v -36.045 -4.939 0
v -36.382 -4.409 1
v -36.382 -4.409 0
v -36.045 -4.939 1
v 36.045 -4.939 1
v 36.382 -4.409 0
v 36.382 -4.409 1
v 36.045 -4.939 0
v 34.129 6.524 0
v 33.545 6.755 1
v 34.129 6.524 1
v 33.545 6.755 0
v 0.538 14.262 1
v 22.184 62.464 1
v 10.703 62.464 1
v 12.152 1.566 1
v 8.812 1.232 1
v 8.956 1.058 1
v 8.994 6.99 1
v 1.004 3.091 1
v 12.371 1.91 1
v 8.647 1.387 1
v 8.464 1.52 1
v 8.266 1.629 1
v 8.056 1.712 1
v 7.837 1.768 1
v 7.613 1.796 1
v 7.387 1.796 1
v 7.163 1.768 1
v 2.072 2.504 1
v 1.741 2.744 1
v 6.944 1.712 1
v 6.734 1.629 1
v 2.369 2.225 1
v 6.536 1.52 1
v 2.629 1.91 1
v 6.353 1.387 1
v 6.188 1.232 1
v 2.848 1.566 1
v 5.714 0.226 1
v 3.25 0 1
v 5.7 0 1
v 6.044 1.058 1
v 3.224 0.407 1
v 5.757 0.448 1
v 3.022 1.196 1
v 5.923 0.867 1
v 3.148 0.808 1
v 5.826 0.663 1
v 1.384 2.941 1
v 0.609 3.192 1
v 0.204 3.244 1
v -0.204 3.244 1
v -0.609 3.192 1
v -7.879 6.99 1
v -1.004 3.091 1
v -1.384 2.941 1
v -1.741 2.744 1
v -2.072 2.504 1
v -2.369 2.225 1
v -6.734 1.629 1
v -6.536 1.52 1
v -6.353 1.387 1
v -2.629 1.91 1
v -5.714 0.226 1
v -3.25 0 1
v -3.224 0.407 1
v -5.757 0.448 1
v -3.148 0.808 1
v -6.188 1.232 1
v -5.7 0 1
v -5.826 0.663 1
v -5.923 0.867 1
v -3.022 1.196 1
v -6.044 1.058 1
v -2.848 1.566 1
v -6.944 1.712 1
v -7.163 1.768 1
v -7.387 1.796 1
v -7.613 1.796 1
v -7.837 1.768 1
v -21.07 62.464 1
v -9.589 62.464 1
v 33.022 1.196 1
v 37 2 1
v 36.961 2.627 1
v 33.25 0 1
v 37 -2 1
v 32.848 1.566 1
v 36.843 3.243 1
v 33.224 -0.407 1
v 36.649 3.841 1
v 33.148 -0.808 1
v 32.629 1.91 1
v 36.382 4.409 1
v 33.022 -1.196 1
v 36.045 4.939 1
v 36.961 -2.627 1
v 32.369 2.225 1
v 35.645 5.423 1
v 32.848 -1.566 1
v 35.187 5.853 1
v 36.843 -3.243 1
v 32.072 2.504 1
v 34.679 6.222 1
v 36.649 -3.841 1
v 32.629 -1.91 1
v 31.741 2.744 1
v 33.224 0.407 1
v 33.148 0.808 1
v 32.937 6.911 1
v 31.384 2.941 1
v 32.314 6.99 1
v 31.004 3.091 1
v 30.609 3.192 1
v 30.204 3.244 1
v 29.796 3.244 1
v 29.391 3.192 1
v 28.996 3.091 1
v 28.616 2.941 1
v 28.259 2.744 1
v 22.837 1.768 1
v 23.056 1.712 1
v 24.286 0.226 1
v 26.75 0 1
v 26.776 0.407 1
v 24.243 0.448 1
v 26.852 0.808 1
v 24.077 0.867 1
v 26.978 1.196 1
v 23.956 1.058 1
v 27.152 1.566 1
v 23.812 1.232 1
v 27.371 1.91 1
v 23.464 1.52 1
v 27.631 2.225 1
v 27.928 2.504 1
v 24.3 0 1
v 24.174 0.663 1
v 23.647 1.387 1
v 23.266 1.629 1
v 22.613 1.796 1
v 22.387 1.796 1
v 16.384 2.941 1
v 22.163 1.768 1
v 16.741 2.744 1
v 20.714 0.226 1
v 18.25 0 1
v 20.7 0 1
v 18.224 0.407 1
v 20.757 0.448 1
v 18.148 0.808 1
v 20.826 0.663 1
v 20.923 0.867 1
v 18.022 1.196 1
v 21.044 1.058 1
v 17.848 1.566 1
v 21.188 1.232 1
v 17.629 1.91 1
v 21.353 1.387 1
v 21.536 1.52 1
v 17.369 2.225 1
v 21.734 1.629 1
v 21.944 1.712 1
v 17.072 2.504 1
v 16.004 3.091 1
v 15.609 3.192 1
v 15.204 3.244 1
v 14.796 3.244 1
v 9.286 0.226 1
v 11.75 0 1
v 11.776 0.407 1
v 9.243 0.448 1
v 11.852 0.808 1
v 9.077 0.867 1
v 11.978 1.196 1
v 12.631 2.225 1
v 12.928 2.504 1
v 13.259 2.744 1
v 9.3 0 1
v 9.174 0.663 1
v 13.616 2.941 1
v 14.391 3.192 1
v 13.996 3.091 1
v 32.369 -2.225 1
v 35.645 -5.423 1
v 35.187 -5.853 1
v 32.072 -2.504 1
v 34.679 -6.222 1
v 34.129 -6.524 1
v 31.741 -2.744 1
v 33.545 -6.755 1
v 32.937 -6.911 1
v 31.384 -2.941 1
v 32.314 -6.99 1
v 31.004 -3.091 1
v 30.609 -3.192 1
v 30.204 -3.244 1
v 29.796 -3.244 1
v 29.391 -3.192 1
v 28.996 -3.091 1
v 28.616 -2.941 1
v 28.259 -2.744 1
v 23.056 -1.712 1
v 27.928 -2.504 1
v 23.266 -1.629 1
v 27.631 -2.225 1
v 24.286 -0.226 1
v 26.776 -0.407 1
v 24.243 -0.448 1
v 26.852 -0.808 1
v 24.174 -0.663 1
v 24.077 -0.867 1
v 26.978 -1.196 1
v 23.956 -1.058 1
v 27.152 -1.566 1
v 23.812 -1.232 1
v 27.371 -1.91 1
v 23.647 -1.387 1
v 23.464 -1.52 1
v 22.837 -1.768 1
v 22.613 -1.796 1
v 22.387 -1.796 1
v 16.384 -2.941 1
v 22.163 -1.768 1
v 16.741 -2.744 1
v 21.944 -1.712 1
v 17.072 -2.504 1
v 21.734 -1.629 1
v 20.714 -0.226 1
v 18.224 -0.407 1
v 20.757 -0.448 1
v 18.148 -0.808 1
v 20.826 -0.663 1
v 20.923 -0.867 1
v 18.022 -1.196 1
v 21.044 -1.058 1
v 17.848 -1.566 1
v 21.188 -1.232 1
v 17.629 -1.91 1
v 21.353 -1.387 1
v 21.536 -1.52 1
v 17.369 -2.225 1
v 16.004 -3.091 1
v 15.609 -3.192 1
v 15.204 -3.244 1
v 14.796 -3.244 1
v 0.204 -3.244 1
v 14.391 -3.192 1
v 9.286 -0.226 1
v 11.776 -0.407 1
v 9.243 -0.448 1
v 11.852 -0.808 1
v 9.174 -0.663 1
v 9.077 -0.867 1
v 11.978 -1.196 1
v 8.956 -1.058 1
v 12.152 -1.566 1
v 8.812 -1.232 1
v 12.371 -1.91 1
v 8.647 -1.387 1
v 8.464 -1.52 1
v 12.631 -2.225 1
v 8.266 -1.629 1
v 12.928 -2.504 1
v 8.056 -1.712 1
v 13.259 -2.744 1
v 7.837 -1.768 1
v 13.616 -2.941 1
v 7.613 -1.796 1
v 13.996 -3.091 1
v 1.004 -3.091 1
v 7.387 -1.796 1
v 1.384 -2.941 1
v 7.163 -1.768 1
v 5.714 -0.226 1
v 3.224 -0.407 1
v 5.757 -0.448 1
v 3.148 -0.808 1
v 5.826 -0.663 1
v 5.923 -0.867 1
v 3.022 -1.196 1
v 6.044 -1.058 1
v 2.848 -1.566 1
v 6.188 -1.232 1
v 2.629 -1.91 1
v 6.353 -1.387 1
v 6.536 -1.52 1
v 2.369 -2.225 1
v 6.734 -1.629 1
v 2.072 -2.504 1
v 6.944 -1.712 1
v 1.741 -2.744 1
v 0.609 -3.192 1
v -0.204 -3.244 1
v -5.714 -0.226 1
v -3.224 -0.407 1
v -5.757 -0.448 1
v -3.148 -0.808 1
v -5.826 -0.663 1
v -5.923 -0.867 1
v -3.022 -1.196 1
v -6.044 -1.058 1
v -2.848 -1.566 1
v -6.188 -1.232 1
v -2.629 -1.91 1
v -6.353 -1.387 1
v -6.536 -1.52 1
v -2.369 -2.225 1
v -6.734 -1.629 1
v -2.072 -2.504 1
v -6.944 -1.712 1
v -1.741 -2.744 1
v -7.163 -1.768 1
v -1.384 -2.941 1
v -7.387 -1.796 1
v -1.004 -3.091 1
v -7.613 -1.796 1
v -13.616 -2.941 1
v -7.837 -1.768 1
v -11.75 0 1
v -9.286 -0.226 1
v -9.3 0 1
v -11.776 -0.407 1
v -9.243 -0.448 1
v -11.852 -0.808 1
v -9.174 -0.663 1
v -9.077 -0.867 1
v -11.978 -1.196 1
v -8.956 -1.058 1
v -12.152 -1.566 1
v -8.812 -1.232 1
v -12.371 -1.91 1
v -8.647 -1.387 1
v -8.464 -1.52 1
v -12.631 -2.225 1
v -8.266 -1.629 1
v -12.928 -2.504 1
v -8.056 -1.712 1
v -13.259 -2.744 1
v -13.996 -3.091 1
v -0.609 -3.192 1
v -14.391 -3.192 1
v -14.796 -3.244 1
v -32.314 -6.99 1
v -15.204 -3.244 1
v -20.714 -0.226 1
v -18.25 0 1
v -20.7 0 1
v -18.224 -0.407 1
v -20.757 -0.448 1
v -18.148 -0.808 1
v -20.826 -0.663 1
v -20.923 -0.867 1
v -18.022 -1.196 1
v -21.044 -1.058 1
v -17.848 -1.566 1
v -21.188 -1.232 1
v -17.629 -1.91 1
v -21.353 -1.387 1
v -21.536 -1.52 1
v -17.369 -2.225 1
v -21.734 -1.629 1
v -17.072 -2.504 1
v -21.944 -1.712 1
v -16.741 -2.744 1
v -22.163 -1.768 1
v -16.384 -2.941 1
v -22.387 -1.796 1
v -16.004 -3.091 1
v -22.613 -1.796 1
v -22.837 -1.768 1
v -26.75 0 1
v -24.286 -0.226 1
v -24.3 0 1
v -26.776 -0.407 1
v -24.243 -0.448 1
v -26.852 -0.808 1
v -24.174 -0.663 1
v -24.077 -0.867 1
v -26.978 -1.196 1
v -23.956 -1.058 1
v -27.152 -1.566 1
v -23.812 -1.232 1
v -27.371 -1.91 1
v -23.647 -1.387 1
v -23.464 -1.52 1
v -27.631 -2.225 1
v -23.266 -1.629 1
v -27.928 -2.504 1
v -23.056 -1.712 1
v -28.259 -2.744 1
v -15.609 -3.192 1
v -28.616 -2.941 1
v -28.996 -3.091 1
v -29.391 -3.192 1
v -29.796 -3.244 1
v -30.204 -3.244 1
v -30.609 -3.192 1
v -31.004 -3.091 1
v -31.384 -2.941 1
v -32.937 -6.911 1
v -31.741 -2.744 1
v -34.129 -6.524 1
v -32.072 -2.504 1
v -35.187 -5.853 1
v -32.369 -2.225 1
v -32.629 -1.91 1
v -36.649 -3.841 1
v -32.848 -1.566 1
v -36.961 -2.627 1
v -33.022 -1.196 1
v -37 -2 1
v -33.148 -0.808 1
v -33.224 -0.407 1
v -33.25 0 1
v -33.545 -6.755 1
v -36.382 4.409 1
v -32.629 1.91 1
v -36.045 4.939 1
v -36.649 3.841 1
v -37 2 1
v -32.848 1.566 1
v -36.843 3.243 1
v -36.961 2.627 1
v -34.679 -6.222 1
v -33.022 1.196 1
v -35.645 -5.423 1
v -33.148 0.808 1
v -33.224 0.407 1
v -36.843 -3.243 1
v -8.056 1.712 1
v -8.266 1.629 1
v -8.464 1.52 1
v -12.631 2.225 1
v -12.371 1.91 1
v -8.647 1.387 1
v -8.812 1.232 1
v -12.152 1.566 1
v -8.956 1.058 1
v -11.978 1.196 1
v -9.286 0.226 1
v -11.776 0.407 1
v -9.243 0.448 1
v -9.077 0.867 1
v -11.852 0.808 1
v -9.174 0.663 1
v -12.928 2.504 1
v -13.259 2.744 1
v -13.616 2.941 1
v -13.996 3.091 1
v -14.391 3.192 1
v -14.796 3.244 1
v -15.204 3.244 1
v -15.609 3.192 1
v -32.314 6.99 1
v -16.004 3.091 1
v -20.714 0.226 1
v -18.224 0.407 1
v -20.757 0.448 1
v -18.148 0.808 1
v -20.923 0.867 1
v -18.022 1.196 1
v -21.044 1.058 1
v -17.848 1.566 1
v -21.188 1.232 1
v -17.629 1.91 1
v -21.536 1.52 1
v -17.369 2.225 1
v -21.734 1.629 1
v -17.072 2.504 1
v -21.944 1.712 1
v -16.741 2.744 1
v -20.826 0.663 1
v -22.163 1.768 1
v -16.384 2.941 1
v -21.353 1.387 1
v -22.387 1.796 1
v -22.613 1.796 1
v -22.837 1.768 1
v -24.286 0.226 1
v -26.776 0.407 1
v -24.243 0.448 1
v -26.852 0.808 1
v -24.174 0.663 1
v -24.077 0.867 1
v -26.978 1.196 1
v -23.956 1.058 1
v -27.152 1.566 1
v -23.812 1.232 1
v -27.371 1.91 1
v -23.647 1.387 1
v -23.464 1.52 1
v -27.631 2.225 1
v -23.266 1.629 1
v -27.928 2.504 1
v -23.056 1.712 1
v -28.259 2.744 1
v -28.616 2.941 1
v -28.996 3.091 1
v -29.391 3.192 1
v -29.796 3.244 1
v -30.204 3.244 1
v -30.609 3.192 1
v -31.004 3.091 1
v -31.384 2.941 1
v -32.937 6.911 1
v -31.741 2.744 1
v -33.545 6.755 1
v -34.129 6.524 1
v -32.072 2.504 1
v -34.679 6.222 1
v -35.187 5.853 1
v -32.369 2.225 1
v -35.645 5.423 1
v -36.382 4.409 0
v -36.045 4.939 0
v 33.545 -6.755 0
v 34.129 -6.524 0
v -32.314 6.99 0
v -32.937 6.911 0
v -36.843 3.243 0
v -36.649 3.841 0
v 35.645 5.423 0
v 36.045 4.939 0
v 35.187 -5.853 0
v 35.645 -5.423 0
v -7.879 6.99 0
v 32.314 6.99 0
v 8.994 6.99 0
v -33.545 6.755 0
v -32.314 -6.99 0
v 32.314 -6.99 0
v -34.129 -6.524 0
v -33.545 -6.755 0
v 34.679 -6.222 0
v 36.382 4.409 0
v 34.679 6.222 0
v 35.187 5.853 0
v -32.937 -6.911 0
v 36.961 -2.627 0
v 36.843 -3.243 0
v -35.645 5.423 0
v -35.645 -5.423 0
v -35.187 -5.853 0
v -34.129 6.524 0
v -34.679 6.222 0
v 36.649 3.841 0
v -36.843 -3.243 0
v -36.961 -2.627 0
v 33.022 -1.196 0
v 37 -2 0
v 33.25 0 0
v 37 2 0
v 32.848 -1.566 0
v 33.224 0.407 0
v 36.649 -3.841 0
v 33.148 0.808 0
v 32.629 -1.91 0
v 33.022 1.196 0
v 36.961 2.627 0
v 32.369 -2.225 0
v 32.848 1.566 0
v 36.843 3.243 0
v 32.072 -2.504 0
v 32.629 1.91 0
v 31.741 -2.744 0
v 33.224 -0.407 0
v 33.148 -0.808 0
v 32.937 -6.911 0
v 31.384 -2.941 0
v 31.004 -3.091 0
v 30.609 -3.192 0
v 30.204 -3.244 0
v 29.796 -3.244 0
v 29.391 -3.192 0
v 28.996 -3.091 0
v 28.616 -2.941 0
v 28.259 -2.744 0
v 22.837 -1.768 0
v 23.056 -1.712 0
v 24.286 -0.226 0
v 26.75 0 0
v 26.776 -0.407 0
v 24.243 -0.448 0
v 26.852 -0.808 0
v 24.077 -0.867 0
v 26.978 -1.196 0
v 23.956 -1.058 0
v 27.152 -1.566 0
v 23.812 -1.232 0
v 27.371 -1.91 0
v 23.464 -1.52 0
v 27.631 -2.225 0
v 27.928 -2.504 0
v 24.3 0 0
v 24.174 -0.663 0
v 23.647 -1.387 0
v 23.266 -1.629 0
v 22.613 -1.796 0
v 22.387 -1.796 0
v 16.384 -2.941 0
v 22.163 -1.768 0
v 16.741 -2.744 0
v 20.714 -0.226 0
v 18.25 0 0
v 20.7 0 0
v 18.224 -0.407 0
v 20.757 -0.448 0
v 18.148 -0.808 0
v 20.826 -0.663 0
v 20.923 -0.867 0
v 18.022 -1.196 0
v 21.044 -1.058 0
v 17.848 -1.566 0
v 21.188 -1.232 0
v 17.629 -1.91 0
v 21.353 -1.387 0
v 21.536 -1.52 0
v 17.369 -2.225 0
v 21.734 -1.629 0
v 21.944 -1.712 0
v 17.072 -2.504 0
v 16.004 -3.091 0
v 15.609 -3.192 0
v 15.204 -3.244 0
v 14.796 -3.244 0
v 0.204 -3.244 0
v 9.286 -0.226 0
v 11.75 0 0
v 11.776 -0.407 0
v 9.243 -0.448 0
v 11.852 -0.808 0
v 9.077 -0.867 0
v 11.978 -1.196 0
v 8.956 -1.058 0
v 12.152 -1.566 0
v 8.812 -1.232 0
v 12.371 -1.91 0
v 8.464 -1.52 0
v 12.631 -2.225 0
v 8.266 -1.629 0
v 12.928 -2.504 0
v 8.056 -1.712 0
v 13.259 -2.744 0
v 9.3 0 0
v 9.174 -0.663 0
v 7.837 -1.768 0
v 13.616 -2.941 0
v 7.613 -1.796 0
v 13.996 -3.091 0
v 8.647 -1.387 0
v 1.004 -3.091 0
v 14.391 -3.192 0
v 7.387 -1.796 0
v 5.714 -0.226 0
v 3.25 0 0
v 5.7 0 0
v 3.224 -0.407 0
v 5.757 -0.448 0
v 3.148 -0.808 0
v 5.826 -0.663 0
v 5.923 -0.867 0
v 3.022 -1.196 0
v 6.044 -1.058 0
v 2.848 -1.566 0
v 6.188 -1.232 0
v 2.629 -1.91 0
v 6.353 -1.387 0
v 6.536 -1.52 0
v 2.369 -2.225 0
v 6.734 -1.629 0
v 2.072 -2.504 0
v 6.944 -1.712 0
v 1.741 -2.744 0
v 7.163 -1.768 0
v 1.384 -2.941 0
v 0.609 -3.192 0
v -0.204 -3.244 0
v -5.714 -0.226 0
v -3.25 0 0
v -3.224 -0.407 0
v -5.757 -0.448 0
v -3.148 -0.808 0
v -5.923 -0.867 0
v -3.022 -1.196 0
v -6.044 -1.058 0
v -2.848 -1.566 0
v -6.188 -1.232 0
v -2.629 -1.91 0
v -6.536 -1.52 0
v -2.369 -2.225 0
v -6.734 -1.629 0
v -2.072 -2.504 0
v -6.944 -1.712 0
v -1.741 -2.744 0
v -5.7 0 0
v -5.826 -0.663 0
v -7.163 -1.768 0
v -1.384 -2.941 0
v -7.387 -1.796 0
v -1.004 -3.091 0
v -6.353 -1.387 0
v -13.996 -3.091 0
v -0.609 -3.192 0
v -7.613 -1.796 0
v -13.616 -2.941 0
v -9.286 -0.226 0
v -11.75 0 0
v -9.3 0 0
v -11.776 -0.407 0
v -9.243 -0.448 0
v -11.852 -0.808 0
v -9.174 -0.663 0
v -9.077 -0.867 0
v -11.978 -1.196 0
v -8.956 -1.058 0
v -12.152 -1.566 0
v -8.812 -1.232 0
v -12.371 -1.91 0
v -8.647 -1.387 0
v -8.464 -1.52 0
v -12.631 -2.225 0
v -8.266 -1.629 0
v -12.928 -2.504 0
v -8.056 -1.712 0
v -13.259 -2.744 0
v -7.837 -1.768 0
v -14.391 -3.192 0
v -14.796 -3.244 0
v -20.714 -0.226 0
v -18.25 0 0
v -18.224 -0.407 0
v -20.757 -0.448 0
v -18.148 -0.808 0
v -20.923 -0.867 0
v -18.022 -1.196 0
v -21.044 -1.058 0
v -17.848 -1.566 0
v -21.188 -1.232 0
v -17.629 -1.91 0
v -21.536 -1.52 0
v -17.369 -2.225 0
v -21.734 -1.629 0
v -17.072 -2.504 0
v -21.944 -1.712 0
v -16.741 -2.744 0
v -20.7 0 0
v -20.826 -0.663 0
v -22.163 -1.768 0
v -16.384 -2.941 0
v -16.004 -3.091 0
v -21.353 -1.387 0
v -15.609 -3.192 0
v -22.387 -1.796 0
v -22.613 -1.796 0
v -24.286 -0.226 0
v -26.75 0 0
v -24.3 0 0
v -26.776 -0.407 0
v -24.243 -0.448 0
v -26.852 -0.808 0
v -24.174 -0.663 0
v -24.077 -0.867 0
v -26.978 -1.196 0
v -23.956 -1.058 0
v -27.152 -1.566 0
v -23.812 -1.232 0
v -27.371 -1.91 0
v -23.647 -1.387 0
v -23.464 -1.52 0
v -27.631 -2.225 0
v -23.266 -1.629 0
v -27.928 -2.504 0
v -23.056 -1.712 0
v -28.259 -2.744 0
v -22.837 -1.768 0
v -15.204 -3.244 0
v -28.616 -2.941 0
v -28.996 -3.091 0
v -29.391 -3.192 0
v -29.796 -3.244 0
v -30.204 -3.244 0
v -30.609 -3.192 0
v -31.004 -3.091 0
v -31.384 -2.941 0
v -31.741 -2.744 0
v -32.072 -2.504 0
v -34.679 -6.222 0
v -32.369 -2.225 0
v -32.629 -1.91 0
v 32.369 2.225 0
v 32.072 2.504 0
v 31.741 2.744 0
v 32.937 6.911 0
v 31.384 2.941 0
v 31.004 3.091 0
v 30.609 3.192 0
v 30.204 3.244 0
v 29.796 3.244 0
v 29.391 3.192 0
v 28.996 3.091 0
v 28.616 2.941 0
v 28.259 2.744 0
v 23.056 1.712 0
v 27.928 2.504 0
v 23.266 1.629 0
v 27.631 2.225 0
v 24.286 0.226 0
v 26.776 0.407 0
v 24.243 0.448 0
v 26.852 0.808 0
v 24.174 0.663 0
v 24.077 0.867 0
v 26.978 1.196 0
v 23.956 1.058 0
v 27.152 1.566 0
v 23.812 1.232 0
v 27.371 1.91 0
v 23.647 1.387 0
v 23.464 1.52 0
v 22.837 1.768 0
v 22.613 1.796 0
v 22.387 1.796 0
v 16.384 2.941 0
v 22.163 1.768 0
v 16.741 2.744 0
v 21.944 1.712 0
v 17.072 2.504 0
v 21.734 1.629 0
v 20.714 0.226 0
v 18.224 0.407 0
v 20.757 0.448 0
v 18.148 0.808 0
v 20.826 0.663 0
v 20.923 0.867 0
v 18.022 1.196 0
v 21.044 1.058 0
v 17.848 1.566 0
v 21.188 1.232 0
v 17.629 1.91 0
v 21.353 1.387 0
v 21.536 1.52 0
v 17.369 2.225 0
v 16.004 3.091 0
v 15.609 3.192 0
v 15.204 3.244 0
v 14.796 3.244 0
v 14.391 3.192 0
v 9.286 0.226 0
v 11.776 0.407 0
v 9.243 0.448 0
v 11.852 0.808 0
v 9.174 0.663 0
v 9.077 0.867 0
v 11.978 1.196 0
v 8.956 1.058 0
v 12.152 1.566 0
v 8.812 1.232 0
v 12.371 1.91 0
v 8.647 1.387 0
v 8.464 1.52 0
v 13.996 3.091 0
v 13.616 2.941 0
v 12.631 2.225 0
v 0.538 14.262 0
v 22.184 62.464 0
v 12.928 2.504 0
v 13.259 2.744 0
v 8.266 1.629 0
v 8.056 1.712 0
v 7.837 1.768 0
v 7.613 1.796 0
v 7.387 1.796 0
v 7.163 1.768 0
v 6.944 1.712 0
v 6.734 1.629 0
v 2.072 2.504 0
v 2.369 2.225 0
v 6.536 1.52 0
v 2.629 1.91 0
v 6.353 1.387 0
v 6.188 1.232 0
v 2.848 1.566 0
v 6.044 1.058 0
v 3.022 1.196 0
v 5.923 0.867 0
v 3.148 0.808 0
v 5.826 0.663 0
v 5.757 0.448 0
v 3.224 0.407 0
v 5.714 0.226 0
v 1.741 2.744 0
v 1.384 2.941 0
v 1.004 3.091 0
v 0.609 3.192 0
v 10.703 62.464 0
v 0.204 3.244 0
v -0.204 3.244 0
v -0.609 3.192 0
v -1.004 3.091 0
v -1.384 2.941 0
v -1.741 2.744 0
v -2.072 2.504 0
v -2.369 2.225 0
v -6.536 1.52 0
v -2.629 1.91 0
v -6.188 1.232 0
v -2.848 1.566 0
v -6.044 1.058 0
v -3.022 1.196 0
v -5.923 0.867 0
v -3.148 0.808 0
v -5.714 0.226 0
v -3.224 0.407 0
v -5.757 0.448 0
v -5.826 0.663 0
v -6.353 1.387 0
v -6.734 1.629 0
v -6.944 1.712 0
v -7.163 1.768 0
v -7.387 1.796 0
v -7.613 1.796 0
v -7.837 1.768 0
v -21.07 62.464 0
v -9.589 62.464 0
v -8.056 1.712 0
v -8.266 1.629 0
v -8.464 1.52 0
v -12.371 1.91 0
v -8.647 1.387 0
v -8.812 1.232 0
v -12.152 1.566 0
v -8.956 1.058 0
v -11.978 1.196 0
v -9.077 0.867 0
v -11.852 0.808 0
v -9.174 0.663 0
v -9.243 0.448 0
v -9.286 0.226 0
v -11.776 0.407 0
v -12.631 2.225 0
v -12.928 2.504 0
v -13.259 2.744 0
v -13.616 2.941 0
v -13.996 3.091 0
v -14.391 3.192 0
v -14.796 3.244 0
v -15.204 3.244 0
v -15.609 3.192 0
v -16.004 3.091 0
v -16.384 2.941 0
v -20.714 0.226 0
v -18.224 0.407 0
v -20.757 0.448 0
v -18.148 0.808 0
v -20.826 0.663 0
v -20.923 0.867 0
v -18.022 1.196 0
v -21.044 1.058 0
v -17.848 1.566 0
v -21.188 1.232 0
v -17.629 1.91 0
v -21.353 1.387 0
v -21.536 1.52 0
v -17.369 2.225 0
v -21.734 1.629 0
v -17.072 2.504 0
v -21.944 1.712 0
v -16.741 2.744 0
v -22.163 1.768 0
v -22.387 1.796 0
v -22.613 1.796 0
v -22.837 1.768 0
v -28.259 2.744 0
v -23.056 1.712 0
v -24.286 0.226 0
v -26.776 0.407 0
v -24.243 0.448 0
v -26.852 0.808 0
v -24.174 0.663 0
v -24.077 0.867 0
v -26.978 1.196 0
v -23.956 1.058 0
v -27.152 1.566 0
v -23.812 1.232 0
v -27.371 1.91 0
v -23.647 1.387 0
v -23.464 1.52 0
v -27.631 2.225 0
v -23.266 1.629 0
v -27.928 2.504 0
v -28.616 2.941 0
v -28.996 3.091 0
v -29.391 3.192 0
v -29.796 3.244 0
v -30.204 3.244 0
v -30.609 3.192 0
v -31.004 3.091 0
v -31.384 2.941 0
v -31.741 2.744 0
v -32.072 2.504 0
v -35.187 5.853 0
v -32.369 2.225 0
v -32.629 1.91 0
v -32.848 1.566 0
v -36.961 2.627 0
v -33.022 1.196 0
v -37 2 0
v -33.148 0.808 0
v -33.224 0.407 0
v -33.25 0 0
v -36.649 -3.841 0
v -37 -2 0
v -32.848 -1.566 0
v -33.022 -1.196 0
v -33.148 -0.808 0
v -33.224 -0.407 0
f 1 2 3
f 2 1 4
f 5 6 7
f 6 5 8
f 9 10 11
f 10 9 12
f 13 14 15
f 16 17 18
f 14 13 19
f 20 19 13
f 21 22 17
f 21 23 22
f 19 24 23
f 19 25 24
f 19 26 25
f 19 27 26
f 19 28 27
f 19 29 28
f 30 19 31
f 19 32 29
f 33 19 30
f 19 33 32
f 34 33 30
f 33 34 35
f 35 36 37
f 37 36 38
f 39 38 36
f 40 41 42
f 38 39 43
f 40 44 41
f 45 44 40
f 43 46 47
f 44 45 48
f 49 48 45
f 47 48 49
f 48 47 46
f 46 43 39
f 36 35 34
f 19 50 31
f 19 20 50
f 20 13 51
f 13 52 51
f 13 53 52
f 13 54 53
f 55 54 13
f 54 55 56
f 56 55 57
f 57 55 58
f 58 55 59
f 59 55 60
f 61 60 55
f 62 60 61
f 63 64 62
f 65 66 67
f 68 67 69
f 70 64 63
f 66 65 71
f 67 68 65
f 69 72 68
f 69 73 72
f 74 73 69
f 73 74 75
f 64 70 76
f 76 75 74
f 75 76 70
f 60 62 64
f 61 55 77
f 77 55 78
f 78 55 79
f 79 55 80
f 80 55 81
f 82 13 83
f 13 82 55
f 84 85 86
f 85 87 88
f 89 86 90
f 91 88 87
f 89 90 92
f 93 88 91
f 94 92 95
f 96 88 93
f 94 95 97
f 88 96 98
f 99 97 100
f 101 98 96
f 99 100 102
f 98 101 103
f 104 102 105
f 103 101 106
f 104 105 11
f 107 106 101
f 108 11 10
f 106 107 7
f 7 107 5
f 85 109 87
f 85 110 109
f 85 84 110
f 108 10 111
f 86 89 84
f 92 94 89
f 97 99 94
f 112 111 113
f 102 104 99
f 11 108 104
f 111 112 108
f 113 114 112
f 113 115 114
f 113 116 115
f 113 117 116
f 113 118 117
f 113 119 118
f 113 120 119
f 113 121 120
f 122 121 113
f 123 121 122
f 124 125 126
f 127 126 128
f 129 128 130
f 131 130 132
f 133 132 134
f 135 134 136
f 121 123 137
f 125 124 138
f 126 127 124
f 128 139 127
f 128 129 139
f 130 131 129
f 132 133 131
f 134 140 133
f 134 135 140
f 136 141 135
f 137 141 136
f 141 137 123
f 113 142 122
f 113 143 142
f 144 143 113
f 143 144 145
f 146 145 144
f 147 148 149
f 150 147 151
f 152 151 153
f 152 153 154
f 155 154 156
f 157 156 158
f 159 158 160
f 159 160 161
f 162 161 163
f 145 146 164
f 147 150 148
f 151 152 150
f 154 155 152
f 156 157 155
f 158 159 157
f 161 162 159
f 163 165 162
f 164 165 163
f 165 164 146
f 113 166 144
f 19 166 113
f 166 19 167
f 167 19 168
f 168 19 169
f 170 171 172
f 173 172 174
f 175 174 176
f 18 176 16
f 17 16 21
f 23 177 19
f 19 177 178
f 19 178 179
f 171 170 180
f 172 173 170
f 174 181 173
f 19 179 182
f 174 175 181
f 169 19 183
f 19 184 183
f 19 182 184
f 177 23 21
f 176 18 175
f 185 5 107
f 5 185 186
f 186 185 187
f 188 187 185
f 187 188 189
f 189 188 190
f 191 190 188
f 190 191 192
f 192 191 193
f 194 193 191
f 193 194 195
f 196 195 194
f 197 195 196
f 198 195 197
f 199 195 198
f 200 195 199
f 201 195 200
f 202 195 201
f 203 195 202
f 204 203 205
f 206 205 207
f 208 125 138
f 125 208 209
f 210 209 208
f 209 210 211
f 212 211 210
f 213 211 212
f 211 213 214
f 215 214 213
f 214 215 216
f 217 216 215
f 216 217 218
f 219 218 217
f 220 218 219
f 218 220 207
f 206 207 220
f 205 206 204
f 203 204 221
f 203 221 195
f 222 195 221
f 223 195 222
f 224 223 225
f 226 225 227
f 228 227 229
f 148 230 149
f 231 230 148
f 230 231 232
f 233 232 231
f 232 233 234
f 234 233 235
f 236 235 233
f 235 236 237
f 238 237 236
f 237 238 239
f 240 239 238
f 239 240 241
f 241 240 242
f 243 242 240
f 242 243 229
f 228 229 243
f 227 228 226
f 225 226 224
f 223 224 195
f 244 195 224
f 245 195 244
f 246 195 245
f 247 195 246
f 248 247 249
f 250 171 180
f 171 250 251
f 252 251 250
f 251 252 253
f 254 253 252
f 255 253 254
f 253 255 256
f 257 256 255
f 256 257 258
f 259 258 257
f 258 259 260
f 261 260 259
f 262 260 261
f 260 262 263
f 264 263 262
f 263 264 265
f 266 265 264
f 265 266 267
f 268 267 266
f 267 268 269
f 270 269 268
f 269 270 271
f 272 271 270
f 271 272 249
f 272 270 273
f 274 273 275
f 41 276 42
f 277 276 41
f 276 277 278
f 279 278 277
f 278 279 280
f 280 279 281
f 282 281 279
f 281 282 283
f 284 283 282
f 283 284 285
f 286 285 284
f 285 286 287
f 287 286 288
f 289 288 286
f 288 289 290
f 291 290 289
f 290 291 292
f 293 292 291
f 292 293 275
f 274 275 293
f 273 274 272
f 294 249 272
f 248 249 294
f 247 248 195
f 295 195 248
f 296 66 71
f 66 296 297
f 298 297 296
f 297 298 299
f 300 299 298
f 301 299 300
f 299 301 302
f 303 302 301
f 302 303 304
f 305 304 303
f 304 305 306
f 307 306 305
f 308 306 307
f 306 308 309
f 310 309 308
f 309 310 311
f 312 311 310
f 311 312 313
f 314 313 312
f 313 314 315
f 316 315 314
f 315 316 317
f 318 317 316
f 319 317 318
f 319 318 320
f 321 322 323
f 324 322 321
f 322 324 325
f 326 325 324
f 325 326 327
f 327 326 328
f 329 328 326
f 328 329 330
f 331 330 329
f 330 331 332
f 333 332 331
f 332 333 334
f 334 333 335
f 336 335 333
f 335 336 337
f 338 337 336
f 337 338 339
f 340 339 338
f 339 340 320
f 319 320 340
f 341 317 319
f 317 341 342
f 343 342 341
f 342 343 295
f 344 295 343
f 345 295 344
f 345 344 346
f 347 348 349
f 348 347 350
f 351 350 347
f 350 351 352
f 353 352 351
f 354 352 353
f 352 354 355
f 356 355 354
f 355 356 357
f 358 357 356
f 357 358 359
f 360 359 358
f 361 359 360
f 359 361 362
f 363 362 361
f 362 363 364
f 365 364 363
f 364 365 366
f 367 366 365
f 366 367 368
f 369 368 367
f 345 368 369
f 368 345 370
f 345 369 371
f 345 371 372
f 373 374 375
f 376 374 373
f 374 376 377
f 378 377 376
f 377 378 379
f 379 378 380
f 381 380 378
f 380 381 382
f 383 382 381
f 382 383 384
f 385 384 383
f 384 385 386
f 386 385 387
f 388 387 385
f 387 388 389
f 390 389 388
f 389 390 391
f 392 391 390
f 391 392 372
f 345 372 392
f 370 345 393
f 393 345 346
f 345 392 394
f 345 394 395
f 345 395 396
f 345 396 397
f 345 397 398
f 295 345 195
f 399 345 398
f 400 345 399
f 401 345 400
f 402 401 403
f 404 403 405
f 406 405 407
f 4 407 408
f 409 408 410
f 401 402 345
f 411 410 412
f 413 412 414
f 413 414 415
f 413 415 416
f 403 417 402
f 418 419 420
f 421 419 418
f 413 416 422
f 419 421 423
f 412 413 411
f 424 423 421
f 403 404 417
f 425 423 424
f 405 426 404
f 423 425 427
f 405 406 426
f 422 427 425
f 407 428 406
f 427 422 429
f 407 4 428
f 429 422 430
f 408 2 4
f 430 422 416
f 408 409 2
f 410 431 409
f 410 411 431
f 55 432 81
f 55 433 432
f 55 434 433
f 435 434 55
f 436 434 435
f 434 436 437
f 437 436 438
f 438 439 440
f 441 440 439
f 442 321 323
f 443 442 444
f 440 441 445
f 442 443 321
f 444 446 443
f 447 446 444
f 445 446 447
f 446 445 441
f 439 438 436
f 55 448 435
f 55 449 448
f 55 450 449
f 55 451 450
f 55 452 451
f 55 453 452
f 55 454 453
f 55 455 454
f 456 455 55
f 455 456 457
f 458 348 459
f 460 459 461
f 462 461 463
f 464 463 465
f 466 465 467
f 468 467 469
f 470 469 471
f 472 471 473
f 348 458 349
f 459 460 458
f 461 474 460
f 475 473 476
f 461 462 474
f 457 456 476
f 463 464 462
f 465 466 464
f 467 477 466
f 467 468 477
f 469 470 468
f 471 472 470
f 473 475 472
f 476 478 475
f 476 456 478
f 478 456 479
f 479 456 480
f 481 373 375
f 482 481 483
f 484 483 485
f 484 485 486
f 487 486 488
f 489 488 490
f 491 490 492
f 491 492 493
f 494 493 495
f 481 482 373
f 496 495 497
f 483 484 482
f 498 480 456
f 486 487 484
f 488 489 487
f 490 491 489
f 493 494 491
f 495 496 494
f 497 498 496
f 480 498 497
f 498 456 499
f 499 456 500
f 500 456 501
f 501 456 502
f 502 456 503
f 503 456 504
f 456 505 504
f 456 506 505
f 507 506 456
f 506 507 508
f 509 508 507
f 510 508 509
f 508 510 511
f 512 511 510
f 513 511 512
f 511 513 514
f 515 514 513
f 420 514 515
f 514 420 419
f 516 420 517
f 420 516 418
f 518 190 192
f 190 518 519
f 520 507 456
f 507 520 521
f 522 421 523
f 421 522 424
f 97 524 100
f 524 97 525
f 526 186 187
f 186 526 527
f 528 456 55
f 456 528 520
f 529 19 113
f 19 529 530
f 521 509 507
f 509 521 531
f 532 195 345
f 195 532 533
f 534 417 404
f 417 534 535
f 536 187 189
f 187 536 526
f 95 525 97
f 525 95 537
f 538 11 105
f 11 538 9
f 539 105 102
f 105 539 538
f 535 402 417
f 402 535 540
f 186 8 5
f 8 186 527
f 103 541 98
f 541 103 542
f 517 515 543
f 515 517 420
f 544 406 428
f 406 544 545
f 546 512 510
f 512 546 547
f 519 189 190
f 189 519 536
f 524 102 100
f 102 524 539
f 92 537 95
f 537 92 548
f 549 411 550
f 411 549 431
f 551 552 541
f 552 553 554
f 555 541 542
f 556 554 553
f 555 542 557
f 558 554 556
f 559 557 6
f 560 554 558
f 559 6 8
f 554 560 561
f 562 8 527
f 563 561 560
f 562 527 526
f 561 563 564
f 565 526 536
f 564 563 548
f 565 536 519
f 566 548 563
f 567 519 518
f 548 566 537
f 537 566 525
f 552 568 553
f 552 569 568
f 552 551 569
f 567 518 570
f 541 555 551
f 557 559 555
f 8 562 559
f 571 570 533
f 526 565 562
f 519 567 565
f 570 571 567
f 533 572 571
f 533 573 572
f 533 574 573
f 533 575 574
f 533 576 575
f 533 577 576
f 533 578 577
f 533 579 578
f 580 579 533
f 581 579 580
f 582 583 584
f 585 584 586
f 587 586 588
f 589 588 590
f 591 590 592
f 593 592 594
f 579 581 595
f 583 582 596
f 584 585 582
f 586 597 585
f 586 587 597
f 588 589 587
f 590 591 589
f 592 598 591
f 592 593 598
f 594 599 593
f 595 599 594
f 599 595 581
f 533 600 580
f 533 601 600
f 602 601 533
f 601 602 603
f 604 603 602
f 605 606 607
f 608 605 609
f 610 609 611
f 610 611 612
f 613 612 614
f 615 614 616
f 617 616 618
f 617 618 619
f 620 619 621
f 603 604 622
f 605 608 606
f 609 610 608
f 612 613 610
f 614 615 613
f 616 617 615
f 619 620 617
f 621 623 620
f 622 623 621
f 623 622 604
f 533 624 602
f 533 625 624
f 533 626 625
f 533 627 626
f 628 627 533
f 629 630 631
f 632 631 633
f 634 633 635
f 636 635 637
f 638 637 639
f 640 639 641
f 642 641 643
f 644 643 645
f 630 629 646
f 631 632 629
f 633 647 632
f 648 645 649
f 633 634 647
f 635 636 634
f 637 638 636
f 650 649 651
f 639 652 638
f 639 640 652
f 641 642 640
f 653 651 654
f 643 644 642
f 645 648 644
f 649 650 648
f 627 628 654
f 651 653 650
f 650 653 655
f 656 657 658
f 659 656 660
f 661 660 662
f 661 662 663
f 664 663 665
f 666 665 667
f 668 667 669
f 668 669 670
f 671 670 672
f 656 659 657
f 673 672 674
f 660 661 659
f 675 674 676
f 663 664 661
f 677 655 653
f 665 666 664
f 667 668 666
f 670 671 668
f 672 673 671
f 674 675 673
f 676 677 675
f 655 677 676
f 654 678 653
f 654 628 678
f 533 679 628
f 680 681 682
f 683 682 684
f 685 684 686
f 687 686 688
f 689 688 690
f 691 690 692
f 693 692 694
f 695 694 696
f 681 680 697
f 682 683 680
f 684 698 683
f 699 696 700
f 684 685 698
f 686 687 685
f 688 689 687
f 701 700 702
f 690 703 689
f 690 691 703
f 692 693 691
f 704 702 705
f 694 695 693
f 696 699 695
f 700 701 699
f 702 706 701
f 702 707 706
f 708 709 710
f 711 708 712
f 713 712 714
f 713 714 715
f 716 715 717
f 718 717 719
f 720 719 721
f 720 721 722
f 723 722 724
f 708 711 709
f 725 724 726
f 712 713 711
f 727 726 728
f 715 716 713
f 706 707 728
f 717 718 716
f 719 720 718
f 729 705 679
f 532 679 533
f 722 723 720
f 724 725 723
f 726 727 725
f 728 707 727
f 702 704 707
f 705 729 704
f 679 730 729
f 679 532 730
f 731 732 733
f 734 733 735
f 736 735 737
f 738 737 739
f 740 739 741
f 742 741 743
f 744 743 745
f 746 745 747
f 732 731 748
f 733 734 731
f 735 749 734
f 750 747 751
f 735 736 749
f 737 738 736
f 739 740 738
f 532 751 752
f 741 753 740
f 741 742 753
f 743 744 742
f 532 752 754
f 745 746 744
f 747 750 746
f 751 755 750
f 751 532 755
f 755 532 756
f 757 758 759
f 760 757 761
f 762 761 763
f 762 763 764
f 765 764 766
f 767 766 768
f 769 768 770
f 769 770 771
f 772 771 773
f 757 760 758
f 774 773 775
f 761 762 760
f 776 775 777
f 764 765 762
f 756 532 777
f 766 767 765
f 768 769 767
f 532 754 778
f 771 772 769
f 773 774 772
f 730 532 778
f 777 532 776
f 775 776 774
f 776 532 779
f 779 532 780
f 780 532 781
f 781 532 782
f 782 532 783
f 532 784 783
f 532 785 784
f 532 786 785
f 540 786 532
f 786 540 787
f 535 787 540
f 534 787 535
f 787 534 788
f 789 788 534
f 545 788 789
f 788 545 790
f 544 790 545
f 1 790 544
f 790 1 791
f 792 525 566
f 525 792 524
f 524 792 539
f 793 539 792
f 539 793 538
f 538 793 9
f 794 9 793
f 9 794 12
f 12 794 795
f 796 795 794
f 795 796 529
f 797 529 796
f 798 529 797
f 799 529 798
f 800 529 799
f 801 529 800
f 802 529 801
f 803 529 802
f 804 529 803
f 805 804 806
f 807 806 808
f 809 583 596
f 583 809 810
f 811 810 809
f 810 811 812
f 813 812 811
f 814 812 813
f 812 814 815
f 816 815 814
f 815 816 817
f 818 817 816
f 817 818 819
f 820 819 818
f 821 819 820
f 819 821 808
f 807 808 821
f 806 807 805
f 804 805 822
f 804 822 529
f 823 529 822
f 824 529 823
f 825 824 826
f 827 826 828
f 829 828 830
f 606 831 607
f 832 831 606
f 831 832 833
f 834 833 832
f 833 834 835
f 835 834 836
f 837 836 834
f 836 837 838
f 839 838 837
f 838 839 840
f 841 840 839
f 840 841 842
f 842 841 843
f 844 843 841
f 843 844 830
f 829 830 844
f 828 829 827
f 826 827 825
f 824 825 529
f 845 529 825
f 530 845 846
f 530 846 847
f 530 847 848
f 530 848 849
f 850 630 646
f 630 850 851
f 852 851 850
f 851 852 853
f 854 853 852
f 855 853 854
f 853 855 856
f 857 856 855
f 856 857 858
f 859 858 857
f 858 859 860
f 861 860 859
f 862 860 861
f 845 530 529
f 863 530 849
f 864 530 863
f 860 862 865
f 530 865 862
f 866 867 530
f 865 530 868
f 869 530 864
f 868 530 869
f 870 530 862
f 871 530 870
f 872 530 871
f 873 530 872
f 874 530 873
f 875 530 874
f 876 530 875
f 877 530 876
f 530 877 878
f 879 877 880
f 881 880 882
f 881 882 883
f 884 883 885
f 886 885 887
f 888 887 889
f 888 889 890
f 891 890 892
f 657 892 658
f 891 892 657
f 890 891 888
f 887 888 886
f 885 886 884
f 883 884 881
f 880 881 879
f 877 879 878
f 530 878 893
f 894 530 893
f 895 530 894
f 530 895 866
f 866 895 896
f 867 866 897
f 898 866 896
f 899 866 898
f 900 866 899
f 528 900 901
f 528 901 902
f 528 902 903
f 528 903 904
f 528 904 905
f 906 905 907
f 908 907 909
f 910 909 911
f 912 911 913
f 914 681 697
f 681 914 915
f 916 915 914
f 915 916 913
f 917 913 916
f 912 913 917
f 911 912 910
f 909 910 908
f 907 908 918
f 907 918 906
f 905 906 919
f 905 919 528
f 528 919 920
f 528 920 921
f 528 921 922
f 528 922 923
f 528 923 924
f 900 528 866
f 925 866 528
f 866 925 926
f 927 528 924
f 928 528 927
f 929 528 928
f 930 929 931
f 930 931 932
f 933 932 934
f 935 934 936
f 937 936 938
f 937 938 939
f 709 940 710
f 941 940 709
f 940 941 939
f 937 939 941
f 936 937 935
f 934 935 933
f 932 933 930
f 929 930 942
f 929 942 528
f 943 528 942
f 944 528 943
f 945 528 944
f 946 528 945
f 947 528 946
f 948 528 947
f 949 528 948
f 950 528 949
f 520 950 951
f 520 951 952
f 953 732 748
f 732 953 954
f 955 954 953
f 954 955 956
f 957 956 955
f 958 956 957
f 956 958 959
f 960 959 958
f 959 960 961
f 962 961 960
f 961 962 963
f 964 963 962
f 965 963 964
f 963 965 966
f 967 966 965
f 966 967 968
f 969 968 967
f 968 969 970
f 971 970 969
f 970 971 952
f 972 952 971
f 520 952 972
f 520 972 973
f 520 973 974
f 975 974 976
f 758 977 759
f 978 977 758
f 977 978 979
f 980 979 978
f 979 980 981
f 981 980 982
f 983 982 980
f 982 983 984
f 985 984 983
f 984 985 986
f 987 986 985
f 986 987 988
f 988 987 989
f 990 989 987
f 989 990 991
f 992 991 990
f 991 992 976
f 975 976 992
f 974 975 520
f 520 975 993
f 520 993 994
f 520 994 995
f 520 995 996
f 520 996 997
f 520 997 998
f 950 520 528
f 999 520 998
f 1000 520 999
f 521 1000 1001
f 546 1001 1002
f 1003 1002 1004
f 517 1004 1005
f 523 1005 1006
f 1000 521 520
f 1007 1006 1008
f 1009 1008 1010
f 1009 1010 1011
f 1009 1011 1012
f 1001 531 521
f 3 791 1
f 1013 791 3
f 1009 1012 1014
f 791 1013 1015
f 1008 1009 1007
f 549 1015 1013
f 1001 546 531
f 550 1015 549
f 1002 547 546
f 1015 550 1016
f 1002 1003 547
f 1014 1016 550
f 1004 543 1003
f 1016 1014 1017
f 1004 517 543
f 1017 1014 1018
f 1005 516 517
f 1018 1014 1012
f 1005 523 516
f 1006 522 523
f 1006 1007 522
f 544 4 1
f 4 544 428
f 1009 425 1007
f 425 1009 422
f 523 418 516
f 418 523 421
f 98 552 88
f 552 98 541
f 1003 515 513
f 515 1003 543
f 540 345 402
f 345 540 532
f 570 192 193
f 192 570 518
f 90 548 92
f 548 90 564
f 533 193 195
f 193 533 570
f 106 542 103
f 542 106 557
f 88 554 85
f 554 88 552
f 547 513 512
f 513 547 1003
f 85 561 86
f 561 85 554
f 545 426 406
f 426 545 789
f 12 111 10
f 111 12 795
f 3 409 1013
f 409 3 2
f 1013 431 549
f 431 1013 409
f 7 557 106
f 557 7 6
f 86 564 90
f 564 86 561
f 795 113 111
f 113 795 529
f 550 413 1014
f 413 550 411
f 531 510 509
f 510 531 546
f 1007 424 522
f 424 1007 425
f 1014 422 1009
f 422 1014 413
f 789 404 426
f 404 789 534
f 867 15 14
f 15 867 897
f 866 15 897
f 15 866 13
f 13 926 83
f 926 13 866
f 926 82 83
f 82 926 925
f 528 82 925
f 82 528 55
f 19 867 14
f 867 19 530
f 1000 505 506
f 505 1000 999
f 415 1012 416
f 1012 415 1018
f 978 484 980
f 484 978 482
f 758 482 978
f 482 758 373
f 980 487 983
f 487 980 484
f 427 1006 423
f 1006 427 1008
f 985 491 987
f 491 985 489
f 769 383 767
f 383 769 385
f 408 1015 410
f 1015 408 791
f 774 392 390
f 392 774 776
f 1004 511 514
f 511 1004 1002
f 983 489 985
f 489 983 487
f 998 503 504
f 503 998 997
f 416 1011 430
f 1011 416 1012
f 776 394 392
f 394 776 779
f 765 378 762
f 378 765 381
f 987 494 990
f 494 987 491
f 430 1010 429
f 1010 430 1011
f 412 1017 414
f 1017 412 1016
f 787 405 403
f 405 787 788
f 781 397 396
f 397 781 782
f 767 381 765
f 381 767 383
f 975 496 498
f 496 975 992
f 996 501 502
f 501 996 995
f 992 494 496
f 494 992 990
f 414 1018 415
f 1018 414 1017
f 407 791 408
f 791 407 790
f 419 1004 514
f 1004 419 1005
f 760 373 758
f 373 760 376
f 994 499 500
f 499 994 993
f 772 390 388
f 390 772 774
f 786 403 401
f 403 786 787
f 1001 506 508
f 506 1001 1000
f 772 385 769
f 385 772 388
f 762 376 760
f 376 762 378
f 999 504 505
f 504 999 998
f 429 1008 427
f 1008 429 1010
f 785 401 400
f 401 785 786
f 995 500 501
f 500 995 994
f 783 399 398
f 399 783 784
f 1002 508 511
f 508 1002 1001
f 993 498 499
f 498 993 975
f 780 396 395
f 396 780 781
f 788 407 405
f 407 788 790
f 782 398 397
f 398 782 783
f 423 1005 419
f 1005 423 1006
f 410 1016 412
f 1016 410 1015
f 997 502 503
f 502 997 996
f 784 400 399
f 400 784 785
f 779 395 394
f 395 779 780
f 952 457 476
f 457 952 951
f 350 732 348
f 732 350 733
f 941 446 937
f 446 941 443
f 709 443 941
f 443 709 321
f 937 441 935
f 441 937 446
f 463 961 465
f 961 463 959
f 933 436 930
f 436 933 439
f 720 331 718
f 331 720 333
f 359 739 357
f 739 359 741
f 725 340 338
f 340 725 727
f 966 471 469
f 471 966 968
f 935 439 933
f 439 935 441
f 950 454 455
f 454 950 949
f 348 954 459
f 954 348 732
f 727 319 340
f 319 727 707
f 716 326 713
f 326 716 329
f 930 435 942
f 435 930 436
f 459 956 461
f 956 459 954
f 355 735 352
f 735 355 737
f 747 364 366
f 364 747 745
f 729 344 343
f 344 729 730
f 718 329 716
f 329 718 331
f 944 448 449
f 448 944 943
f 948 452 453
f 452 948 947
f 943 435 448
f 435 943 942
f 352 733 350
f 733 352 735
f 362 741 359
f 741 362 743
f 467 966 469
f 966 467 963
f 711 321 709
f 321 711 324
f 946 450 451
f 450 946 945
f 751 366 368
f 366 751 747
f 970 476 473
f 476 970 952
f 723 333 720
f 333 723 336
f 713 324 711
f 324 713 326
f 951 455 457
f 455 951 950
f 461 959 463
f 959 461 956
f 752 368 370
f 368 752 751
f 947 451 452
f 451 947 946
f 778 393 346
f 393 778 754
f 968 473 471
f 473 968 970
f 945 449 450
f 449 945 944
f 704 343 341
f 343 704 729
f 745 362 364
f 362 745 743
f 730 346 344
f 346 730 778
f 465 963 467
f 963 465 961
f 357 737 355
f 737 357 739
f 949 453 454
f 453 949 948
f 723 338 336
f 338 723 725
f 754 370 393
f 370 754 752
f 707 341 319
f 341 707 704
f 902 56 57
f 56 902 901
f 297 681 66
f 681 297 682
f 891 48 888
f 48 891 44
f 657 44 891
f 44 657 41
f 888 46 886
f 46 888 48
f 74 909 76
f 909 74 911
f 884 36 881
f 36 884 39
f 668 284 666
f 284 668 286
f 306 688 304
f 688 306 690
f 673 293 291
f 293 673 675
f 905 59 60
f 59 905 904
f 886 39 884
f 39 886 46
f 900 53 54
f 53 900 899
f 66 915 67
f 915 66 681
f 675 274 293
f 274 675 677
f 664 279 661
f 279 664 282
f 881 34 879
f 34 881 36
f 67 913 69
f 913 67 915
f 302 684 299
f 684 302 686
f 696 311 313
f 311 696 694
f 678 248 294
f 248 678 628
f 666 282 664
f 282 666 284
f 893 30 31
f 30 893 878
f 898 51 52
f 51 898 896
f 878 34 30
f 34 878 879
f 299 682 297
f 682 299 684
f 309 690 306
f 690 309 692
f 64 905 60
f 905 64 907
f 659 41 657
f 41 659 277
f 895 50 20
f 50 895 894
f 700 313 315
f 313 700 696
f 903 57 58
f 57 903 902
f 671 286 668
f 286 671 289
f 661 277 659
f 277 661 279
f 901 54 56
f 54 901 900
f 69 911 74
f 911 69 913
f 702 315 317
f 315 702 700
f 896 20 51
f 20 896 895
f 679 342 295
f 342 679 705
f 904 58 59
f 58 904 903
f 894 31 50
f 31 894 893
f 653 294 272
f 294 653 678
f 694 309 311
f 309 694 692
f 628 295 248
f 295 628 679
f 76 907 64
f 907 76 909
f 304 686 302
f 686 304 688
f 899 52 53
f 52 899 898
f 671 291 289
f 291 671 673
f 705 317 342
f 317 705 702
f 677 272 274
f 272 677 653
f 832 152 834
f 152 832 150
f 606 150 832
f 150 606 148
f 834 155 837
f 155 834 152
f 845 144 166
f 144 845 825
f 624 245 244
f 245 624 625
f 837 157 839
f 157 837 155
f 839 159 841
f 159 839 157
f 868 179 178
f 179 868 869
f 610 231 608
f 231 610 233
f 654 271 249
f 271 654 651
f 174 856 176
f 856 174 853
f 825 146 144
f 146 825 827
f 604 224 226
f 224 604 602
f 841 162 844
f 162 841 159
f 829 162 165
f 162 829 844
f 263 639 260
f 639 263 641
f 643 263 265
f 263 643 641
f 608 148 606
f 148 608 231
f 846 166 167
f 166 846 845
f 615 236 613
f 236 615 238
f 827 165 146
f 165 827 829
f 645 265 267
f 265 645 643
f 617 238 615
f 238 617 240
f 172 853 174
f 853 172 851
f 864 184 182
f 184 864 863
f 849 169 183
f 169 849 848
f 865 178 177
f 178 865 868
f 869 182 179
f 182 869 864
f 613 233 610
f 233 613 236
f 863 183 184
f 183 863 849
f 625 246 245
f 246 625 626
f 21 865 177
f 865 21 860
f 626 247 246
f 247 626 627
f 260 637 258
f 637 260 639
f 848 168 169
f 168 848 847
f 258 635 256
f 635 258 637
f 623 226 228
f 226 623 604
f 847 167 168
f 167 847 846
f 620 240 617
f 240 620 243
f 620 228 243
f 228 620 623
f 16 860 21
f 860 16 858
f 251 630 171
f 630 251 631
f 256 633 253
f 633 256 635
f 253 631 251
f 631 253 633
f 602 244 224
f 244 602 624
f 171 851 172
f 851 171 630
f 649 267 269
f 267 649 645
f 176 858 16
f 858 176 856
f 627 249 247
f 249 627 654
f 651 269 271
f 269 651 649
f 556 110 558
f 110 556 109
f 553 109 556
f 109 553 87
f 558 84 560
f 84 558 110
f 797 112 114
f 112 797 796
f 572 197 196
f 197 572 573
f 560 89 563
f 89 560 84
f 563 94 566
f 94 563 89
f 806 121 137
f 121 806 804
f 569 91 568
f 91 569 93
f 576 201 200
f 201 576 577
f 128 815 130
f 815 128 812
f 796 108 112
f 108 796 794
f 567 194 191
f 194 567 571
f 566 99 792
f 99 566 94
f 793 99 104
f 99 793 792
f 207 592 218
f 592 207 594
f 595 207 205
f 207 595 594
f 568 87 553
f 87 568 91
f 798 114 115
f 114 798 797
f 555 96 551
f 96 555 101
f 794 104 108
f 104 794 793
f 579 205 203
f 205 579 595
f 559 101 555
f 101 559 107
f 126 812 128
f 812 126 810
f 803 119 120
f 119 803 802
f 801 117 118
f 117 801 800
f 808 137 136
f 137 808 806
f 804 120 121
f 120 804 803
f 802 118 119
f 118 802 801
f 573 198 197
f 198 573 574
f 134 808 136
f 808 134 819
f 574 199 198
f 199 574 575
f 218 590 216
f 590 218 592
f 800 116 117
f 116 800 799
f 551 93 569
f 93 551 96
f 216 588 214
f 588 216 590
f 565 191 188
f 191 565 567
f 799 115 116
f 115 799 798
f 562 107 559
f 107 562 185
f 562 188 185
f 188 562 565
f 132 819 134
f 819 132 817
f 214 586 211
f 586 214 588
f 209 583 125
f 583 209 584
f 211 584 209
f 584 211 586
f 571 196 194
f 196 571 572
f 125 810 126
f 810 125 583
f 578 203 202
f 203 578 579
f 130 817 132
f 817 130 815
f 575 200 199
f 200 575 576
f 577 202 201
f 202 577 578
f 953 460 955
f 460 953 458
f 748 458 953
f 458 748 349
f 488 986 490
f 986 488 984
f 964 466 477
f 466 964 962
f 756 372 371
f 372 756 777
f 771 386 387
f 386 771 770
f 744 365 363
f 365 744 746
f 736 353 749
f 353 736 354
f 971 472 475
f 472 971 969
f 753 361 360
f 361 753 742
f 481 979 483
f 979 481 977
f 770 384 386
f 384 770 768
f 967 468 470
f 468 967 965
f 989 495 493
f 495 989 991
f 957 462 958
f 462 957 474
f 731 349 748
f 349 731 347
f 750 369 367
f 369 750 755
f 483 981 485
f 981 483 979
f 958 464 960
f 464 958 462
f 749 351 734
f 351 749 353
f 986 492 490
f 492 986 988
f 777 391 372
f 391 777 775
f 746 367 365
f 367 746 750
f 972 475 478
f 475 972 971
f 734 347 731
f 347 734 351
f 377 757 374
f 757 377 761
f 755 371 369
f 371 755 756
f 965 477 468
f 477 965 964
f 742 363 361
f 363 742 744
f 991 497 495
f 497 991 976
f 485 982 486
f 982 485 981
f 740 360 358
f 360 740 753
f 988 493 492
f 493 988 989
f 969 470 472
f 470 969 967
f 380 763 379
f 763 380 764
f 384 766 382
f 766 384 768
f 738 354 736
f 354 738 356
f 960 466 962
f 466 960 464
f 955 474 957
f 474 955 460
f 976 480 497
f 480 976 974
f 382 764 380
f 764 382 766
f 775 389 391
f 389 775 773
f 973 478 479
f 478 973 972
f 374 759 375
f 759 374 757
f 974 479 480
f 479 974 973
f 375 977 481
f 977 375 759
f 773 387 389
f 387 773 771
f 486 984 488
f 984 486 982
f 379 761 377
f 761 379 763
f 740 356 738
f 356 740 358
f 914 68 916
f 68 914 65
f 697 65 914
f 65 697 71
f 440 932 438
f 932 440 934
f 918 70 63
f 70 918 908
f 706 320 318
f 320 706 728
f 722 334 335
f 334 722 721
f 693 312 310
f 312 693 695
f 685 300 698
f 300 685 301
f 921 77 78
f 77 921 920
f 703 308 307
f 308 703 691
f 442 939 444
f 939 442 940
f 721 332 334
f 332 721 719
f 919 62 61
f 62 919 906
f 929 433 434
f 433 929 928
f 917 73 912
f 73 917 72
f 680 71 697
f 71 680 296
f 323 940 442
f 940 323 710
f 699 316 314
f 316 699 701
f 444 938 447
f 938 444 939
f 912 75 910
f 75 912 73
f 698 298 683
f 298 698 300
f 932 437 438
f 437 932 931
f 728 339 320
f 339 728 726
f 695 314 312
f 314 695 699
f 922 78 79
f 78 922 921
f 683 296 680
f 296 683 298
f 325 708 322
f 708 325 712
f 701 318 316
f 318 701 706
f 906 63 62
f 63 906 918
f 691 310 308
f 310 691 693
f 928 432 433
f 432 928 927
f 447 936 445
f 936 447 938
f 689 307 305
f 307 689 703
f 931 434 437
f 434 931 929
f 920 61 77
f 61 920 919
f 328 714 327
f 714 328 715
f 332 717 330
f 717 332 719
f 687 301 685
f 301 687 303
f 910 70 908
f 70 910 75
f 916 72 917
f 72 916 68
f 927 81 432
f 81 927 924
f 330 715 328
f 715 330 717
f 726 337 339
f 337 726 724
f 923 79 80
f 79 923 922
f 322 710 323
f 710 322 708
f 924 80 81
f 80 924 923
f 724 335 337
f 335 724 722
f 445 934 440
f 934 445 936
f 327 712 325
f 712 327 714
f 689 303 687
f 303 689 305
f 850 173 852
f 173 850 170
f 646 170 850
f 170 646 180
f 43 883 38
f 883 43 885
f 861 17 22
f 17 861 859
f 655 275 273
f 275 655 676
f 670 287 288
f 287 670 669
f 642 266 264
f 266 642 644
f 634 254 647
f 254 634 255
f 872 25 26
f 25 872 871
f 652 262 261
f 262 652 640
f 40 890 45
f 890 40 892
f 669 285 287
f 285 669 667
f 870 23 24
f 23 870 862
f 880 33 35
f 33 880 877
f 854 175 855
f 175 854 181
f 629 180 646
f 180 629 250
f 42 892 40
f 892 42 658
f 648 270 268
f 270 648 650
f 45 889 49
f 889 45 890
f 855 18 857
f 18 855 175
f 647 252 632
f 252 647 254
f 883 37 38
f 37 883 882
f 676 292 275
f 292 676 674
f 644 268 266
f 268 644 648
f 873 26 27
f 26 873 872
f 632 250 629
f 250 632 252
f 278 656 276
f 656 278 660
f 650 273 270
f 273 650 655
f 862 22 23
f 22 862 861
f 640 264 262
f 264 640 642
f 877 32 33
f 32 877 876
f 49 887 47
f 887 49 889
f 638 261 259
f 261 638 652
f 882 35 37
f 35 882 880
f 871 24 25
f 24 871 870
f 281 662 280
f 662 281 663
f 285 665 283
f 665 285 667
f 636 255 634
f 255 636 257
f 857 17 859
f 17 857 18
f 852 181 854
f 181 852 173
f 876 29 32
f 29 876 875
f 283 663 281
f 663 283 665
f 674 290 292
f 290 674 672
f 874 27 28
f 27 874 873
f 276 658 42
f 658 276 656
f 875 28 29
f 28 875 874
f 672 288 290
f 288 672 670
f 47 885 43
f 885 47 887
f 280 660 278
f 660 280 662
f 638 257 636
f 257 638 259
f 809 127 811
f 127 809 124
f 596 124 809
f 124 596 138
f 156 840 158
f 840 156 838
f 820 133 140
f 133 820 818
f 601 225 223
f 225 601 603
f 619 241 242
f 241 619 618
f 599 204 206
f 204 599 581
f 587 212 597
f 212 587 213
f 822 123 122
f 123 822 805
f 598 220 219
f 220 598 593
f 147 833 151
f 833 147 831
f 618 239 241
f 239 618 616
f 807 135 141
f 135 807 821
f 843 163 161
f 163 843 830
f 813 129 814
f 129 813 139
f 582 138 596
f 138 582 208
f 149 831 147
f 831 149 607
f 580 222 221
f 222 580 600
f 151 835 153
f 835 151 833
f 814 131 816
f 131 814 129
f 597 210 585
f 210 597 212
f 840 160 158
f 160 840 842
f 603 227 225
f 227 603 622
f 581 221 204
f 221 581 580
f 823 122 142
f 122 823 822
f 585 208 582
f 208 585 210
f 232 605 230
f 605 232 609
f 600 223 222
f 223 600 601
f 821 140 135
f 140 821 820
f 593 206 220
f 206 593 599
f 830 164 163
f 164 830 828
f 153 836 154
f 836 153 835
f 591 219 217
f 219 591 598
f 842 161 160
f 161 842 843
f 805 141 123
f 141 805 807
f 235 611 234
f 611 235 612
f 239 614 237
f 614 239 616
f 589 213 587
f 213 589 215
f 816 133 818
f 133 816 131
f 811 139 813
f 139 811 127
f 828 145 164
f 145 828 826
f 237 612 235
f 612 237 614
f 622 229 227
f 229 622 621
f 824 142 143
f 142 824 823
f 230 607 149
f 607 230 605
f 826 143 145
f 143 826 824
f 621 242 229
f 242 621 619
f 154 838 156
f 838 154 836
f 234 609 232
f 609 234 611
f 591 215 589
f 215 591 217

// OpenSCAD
$fn = 50;


difference() {
	union() {
		hull() {
			translate(v = [-32.0000000000, 2.0000000000, 0]) {
				cylinder(h = 1, r = 5);
			}
			translate(v = [32.0000000000, 2.0000000000, 0]) {
				cylinder(h = 1, r = 5);
			}
			translate(v = [-32.0000000000, -2.0000000000, 0]) {
				cylinder(h = 1, r = 5);
			}
			translate(v = [32.0000000000, -2.0000000000, 0]) {
				cylinder(h = 1, r = 5);
			}
		}
		translate(v = [0, 61.1111111111, 0]) {
			linear_extrude(height = 1) {
				text(font = "DejaVu Sans Mono:style=Bold", halign = "center", size = 57.0000000000, text = "V", valign = "top");
			}
		}
	}
	union() {
		translate(v = [-30.0000000000, 0.0000000000, 0]) {
			translate(v = [0, 0, -100]) {
				cylinder(h = 200, r = 3.2500000000);
			}
		}
		translate(v = [-15.0000000000, 0.0000000000, 0]) {
			translate(v = [0, 0, -100]) {
				cylinder(h = 200, r = 3.2500000000);
			}
		}
		translate(v = [0, 0, -100]) {
			cylinder(h = 200, r = 3.2500000000);
		}
		translate(v = [15.0000000000, 0.0000000000, 0]) {
			translate(v = [0, 0, -100]) {
				cylinder(h = 200, r = 3.2500000000);
			}
		}
		translate(v = [30.0000000000, 0.0000000000, 0]) {
			translate(v = [0, 0, -100]) {
				cylinder(h = 200, r = 3.2500000000);
			}
		}
		translate(v = [-30.0000000000, 0.0000000000, 0]) {
			translate(v = [0, 0, -100]) {
				cylinder(h = 200, r = 1.8000000000);
			}
		}
		translate(v = [-22.5000000000, 0.0000000000, 0]) {
			translate(v = [0, 0, -100]) {
				cylinder(h = 200, r = 1.8000000000);
			}
		}
		translate(v = [-15.0000000000, 0.0000000000, 0]) {
			translate(v = [0, 0, -100]) {
				cylinder(h = 200, r = 1.8000000000);
			}
		}
		translate(v = [-7.5000000000, 0.0000000000, 0]) {
			translate(v = [0, 0, -100]) {
				cylinder(h = 200, r = 1.8000000000);
			}
		}
		translate(v = [0, 0, -100]) {
			cylinder(h = 200, r = 1.8000000000);
		}
		translate(v = [7.5000000000, 0.0000000000, 0]) {
			translate(v = [0, 0, -100]) {
				cylinder(h = 200, r = 1.8000000000);
			}
		}
		translate(v = [15.0000000000, 0.0000000000, 0]) {
			translate(v = [0, 0, -100]) {
				cylinder(h = 200, r = 1.8000000000);
			}
		}
		translate(v = [22.5000000000, 0.0000000000, 0]) {
			translate(v = [0, 0, -100]) {
				cylinder(h = 200, r = 1.8000000000);
			}
		}
		translate(v = [30.0000000000, 0.0000000000, 0]) {
			translate(v = [0, 0, -100]) {
				cylinder(h = 200, r = 1.8000000000);
			}
		}
	}
}
